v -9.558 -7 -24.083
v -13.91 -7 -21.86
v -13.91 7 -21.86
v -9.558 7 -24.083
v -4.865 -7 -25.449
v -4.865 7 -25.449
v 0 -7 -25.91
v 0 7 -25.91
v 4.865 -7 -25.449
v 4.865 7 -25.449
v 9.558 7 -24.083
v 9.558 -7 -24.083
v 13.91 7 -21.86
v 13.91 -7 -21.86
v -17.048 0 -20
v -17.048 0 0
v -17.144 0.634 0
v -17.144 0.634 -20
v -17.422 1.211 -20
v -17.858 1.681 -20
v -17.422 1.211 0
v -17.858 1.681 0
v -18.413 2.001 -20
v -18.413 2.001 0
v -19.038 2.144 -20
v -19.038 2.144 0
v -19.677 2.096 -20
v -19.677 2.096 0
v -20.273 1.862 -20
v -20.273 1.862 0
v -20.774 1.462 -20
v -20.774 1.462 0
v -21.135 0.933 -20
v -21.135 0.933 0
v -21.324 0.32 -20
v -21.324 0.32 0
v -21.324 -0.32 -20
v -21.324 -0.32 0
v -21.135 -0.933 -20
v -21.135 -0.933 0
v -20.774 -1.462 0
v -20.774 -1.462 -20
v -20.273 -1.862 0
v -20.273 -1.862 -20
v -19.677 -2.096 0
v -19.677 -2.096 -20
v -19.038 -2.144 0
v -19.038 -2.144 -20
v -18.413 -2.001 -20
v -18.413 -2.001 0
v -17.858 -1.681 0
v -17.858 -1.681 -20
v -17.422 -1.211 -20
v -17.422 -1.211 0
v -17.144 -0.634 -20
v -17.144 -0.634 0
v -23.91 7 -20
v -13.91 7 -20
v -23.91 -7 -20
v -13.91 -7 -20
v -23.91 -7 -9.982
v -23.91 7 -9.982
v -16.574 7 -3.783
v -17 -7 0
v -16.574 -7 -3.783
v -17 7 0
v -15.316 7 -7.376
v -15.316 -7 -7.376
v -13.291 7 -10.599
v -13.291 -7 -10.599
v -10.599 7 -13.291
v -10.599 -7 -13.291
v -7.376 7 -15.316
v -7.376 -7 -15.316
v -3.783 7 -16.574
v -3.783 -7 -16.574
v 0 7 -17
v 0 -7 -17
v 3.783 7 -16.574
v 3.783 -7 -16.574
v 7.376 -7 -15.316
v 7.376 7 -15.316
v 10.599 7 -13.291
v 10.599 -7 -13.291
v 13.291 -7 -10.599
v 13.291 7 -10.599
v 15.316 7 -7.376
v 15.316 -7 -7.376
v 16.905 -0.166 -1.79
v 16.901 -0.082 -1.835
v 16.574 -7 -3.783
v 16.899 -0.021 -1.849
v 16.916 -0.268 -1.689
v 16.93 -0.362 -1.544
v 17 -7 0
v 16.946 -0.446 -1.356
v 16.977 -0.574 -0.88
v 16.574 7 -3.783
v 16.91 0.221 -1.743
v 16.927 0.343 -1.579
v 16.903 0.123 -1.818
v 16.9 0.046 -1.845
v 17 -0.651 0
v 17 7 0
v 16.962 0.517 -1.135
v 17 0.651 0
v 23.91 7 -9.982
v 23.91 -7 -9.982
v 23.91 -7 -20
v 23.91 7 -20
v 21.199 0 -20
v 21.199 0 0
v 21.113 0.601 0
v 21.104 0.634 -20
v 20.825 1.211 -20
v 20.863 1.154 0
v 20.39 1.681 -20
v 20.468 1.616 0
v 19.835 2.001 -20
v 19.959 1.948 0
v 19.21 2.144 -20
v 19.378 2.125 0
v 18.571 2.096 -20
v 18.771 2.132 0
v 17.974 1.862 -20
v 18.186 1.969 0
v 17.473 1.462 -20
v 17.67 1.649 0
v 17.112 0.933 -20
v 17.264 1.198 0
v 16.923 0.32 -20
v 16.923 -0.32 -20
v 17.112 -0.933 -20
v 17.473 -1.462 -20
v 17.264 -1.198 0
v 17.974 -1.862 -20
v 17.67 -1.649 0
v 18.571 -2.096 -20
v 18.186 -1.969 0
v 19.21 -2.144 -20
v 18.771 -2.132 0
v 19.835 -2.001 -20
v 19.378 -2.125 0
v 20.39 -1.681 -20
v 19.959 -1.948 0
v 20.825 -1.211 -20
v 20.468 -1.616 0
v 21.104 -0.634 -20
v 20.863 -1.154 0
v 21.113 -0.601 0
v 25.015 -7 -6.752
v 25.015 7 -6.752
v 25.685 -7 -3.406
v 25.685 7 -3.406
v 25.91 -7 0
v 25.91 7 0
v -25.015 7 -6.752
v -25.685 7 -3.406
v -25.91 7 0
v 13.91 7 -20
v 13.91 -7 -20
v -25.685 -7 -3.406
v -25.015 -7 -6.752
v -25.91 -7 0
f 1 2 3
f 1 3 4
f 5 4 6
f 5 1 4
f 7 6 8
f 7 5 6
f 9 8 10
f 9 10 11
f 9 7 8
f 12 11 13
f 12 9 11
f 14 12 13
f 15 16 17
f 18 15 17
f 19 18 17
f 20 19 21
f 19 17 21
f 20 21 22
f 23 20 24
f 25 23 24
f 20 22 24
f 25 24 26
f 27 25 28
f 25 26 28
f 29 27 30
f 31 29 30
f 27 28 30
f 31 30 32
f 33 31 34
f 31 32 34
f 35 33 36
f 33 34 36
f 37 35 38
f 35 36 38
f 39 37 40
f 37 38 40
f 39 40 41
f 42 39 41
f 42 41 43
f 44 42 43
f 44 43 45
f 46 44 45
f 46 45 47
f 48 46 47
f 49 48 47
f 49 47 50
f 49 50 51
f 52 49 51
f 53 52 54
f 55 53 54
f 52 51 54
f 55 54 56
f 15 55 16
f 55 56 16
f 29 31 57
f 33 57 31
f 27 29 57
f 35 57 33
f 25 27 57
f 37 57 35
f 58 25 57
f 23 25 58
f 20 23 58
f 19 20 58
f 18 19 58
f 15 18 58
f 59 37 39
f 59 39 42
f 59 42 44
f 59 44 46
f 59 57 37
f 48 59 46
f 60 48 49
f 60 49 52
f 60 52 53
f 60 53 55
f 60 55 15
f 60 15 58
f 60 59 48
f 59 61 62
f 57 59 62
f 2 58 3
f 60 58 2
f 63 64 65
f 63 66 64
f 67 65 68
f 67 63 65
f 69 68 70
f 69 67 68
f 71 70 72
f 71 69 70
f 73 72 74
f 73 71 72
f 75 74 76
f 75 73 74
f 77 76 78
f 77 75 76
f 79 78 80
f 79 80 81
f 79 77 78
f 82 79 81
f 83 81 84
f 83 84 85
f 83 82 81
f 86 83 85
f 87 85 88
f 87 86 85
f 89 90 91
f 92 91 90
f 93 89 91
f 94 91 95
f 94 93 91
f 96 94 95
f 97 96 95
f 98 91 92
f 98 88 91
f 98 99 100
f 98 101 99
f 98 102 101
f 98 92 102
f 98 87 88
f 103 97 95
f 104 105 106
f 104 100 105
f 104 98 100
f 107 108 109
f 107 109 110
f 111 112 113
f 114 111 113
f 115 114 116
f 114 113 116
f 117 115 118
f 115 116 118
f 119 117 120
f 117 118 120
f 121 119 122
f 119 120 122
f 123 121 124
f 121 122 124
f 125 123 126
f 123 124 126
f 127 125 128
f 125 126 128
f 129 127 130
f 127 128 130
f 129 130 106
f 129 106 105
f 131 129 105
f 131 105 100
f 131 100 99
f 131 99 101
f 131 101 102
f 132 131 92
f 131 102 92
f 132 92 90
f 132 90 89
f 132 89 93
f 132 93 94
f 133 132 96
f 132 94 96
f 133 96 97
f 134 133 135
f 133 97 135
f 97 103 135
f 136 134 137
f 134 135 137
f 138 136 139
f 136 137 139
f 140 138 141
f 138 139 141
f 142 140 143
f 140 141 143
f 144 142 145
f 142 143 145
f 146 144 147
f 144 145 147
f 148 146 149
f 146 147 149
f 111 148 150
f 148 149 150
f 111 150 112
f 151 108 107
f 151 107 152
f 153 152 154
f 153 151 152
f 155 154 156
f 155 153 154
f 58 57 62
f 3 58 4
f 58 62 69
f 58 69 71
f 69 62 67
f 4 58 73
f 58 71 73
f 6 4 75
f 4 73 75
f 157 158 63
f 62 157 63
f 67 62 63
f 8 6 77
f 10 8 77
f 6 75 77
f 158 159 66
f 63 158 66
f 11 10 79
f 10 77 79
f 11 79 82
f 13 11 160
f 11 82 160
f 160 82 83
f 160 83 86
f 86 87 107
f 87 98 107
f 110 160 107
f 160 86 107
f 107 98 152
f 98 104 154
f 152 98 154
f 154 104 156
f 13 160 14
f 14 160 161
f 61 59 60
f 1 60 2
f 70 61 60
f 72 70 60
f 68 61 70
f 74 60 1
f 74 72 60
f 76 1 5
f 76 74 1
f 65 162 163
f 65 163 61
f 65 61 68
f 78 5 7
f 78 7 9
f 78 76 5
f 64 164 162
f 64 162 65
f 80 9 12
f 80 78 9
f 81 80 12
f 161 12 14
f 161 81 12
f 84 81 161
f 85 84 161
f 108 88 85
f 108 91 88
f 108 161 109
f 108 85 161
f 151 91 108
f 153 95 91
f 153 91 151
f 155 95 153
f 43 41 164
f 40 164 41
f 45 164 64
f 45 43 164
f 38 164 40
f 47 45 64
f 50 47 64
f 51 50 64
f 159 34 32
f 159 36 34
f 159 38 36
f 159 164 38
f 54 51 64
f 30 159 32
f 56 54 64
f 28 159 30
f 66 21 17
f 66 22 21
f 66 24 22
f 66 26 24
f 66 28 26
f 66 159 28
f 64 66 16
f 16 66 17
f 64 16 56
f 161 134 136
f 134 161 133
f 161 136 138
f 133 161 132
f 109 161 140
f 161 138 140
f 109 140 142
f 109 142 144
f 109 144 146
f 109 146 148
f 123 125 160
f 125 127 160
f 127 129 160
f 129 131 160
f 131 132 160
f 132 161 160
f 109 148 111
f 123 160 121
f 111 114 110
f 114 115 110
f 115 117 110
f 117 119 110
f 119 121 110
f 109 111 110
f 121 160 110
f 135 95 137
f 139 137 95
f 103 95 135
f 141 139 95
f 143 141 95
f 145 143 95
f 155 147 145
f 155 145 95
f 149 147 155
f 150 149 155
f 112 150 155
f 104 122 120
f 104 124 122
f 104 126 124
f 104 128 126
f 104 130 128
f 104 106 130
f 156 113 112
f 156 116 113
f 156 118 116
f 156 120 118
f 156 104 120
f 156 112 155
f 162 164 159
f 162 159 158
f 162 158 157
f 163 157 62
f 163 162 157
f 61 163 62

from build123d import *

# Parameters (mm, degrees)
F0_R          = 25.91
F1_DEPTH      = 7
F1_DEPTH_BACK = 7
F2_R          = 17
F3_DEPTH      = 7
F3_DEPTH_BACK = 7
F6_START      = -6
F5_W          = 8
F5_H          = 14
F6_DEPTH      = 14
F7_R          = 2.15
F8_DEPTH      = 30
F8_DEPTH_BACK = 30
F9_W          = 10
F9_H          = 14
F10_DEPTH     = 10
F11_W         = 75.513869524
F11_H         = 46.2215282023
F12_DEPTH     = 30


with BuildPart() as f1:
    # F0 (on Front) → F1 (new body, two sides)
    with BuildSketch(Plane.XZ) as f1_sk:
        Circle(F0_R)
    extrude(amount=F1_DEPTH)
    extrude(f1_sk.sketch, amount=-F1_DEPTH_BACK)

    # F2 (on Front) → F3 (cut, two sides)
    with BuildSketch(Plane.XZ) as f3_sk:
        Circle(F2_R)
    extrude(amount=-F3_DEPTH, mode=Mode.SUBTRACT)
    extrude(f3_sk.sketch, amount=F3_DEPTH_BACK, mode=Mode.SUBTRACT)

    # F5 (on face) → F6 (join)
    with BuildSketch(Plane.XY.offset(F6_START)):
        with Locations((-19.91, 0)):
            Rectangle(F5_W, F5_H)
        with Locations((19.91, 0)):
            Rectangle(F5_W, F5_H)
    extrude(amount=-F6_DEPTH)

    # F7 (on face) → F8 (cut, two sides)
    with BuildSketch(Plane.XY) as f8_sk:
        with Locations((-19.1982129737, 0)):
            Circle(F7_R)
        with Locations((19.0490627756, 0)):
            Circle(F7_R)
    extrude(amount=F8_DEPTH, mode=Mode.SUBTRACT)
    extrude(f8_sk.sketch, amount=-F8_DEPTH_BACK, mode=Mode.SUBTRACT)

    # F9 (on face) → F10 (cut)
    with BuildSketch(Plane(origin=(0, 0, -20), x_dir=(1, 0, 0), z_dir=(0, 0, -1))):
        with Locations((-18.91, 0)):
            Rectangle(F9_W, F9_H)
        with Locations((18.91, 0)):
            Rectangle(F9_W, F9_H)
    extrude(amount=F10_DEPTH, mode=Mode.SUBTRACT)

    # F11 (on face) → F12 (cut)
    with BuildSketch(Plane.XY):
        Rectangle(F11_W, F11_H)
    extrude(amount=F12_DEPTH, mode=Mode.SUBTRACT)


solid = f1.part
